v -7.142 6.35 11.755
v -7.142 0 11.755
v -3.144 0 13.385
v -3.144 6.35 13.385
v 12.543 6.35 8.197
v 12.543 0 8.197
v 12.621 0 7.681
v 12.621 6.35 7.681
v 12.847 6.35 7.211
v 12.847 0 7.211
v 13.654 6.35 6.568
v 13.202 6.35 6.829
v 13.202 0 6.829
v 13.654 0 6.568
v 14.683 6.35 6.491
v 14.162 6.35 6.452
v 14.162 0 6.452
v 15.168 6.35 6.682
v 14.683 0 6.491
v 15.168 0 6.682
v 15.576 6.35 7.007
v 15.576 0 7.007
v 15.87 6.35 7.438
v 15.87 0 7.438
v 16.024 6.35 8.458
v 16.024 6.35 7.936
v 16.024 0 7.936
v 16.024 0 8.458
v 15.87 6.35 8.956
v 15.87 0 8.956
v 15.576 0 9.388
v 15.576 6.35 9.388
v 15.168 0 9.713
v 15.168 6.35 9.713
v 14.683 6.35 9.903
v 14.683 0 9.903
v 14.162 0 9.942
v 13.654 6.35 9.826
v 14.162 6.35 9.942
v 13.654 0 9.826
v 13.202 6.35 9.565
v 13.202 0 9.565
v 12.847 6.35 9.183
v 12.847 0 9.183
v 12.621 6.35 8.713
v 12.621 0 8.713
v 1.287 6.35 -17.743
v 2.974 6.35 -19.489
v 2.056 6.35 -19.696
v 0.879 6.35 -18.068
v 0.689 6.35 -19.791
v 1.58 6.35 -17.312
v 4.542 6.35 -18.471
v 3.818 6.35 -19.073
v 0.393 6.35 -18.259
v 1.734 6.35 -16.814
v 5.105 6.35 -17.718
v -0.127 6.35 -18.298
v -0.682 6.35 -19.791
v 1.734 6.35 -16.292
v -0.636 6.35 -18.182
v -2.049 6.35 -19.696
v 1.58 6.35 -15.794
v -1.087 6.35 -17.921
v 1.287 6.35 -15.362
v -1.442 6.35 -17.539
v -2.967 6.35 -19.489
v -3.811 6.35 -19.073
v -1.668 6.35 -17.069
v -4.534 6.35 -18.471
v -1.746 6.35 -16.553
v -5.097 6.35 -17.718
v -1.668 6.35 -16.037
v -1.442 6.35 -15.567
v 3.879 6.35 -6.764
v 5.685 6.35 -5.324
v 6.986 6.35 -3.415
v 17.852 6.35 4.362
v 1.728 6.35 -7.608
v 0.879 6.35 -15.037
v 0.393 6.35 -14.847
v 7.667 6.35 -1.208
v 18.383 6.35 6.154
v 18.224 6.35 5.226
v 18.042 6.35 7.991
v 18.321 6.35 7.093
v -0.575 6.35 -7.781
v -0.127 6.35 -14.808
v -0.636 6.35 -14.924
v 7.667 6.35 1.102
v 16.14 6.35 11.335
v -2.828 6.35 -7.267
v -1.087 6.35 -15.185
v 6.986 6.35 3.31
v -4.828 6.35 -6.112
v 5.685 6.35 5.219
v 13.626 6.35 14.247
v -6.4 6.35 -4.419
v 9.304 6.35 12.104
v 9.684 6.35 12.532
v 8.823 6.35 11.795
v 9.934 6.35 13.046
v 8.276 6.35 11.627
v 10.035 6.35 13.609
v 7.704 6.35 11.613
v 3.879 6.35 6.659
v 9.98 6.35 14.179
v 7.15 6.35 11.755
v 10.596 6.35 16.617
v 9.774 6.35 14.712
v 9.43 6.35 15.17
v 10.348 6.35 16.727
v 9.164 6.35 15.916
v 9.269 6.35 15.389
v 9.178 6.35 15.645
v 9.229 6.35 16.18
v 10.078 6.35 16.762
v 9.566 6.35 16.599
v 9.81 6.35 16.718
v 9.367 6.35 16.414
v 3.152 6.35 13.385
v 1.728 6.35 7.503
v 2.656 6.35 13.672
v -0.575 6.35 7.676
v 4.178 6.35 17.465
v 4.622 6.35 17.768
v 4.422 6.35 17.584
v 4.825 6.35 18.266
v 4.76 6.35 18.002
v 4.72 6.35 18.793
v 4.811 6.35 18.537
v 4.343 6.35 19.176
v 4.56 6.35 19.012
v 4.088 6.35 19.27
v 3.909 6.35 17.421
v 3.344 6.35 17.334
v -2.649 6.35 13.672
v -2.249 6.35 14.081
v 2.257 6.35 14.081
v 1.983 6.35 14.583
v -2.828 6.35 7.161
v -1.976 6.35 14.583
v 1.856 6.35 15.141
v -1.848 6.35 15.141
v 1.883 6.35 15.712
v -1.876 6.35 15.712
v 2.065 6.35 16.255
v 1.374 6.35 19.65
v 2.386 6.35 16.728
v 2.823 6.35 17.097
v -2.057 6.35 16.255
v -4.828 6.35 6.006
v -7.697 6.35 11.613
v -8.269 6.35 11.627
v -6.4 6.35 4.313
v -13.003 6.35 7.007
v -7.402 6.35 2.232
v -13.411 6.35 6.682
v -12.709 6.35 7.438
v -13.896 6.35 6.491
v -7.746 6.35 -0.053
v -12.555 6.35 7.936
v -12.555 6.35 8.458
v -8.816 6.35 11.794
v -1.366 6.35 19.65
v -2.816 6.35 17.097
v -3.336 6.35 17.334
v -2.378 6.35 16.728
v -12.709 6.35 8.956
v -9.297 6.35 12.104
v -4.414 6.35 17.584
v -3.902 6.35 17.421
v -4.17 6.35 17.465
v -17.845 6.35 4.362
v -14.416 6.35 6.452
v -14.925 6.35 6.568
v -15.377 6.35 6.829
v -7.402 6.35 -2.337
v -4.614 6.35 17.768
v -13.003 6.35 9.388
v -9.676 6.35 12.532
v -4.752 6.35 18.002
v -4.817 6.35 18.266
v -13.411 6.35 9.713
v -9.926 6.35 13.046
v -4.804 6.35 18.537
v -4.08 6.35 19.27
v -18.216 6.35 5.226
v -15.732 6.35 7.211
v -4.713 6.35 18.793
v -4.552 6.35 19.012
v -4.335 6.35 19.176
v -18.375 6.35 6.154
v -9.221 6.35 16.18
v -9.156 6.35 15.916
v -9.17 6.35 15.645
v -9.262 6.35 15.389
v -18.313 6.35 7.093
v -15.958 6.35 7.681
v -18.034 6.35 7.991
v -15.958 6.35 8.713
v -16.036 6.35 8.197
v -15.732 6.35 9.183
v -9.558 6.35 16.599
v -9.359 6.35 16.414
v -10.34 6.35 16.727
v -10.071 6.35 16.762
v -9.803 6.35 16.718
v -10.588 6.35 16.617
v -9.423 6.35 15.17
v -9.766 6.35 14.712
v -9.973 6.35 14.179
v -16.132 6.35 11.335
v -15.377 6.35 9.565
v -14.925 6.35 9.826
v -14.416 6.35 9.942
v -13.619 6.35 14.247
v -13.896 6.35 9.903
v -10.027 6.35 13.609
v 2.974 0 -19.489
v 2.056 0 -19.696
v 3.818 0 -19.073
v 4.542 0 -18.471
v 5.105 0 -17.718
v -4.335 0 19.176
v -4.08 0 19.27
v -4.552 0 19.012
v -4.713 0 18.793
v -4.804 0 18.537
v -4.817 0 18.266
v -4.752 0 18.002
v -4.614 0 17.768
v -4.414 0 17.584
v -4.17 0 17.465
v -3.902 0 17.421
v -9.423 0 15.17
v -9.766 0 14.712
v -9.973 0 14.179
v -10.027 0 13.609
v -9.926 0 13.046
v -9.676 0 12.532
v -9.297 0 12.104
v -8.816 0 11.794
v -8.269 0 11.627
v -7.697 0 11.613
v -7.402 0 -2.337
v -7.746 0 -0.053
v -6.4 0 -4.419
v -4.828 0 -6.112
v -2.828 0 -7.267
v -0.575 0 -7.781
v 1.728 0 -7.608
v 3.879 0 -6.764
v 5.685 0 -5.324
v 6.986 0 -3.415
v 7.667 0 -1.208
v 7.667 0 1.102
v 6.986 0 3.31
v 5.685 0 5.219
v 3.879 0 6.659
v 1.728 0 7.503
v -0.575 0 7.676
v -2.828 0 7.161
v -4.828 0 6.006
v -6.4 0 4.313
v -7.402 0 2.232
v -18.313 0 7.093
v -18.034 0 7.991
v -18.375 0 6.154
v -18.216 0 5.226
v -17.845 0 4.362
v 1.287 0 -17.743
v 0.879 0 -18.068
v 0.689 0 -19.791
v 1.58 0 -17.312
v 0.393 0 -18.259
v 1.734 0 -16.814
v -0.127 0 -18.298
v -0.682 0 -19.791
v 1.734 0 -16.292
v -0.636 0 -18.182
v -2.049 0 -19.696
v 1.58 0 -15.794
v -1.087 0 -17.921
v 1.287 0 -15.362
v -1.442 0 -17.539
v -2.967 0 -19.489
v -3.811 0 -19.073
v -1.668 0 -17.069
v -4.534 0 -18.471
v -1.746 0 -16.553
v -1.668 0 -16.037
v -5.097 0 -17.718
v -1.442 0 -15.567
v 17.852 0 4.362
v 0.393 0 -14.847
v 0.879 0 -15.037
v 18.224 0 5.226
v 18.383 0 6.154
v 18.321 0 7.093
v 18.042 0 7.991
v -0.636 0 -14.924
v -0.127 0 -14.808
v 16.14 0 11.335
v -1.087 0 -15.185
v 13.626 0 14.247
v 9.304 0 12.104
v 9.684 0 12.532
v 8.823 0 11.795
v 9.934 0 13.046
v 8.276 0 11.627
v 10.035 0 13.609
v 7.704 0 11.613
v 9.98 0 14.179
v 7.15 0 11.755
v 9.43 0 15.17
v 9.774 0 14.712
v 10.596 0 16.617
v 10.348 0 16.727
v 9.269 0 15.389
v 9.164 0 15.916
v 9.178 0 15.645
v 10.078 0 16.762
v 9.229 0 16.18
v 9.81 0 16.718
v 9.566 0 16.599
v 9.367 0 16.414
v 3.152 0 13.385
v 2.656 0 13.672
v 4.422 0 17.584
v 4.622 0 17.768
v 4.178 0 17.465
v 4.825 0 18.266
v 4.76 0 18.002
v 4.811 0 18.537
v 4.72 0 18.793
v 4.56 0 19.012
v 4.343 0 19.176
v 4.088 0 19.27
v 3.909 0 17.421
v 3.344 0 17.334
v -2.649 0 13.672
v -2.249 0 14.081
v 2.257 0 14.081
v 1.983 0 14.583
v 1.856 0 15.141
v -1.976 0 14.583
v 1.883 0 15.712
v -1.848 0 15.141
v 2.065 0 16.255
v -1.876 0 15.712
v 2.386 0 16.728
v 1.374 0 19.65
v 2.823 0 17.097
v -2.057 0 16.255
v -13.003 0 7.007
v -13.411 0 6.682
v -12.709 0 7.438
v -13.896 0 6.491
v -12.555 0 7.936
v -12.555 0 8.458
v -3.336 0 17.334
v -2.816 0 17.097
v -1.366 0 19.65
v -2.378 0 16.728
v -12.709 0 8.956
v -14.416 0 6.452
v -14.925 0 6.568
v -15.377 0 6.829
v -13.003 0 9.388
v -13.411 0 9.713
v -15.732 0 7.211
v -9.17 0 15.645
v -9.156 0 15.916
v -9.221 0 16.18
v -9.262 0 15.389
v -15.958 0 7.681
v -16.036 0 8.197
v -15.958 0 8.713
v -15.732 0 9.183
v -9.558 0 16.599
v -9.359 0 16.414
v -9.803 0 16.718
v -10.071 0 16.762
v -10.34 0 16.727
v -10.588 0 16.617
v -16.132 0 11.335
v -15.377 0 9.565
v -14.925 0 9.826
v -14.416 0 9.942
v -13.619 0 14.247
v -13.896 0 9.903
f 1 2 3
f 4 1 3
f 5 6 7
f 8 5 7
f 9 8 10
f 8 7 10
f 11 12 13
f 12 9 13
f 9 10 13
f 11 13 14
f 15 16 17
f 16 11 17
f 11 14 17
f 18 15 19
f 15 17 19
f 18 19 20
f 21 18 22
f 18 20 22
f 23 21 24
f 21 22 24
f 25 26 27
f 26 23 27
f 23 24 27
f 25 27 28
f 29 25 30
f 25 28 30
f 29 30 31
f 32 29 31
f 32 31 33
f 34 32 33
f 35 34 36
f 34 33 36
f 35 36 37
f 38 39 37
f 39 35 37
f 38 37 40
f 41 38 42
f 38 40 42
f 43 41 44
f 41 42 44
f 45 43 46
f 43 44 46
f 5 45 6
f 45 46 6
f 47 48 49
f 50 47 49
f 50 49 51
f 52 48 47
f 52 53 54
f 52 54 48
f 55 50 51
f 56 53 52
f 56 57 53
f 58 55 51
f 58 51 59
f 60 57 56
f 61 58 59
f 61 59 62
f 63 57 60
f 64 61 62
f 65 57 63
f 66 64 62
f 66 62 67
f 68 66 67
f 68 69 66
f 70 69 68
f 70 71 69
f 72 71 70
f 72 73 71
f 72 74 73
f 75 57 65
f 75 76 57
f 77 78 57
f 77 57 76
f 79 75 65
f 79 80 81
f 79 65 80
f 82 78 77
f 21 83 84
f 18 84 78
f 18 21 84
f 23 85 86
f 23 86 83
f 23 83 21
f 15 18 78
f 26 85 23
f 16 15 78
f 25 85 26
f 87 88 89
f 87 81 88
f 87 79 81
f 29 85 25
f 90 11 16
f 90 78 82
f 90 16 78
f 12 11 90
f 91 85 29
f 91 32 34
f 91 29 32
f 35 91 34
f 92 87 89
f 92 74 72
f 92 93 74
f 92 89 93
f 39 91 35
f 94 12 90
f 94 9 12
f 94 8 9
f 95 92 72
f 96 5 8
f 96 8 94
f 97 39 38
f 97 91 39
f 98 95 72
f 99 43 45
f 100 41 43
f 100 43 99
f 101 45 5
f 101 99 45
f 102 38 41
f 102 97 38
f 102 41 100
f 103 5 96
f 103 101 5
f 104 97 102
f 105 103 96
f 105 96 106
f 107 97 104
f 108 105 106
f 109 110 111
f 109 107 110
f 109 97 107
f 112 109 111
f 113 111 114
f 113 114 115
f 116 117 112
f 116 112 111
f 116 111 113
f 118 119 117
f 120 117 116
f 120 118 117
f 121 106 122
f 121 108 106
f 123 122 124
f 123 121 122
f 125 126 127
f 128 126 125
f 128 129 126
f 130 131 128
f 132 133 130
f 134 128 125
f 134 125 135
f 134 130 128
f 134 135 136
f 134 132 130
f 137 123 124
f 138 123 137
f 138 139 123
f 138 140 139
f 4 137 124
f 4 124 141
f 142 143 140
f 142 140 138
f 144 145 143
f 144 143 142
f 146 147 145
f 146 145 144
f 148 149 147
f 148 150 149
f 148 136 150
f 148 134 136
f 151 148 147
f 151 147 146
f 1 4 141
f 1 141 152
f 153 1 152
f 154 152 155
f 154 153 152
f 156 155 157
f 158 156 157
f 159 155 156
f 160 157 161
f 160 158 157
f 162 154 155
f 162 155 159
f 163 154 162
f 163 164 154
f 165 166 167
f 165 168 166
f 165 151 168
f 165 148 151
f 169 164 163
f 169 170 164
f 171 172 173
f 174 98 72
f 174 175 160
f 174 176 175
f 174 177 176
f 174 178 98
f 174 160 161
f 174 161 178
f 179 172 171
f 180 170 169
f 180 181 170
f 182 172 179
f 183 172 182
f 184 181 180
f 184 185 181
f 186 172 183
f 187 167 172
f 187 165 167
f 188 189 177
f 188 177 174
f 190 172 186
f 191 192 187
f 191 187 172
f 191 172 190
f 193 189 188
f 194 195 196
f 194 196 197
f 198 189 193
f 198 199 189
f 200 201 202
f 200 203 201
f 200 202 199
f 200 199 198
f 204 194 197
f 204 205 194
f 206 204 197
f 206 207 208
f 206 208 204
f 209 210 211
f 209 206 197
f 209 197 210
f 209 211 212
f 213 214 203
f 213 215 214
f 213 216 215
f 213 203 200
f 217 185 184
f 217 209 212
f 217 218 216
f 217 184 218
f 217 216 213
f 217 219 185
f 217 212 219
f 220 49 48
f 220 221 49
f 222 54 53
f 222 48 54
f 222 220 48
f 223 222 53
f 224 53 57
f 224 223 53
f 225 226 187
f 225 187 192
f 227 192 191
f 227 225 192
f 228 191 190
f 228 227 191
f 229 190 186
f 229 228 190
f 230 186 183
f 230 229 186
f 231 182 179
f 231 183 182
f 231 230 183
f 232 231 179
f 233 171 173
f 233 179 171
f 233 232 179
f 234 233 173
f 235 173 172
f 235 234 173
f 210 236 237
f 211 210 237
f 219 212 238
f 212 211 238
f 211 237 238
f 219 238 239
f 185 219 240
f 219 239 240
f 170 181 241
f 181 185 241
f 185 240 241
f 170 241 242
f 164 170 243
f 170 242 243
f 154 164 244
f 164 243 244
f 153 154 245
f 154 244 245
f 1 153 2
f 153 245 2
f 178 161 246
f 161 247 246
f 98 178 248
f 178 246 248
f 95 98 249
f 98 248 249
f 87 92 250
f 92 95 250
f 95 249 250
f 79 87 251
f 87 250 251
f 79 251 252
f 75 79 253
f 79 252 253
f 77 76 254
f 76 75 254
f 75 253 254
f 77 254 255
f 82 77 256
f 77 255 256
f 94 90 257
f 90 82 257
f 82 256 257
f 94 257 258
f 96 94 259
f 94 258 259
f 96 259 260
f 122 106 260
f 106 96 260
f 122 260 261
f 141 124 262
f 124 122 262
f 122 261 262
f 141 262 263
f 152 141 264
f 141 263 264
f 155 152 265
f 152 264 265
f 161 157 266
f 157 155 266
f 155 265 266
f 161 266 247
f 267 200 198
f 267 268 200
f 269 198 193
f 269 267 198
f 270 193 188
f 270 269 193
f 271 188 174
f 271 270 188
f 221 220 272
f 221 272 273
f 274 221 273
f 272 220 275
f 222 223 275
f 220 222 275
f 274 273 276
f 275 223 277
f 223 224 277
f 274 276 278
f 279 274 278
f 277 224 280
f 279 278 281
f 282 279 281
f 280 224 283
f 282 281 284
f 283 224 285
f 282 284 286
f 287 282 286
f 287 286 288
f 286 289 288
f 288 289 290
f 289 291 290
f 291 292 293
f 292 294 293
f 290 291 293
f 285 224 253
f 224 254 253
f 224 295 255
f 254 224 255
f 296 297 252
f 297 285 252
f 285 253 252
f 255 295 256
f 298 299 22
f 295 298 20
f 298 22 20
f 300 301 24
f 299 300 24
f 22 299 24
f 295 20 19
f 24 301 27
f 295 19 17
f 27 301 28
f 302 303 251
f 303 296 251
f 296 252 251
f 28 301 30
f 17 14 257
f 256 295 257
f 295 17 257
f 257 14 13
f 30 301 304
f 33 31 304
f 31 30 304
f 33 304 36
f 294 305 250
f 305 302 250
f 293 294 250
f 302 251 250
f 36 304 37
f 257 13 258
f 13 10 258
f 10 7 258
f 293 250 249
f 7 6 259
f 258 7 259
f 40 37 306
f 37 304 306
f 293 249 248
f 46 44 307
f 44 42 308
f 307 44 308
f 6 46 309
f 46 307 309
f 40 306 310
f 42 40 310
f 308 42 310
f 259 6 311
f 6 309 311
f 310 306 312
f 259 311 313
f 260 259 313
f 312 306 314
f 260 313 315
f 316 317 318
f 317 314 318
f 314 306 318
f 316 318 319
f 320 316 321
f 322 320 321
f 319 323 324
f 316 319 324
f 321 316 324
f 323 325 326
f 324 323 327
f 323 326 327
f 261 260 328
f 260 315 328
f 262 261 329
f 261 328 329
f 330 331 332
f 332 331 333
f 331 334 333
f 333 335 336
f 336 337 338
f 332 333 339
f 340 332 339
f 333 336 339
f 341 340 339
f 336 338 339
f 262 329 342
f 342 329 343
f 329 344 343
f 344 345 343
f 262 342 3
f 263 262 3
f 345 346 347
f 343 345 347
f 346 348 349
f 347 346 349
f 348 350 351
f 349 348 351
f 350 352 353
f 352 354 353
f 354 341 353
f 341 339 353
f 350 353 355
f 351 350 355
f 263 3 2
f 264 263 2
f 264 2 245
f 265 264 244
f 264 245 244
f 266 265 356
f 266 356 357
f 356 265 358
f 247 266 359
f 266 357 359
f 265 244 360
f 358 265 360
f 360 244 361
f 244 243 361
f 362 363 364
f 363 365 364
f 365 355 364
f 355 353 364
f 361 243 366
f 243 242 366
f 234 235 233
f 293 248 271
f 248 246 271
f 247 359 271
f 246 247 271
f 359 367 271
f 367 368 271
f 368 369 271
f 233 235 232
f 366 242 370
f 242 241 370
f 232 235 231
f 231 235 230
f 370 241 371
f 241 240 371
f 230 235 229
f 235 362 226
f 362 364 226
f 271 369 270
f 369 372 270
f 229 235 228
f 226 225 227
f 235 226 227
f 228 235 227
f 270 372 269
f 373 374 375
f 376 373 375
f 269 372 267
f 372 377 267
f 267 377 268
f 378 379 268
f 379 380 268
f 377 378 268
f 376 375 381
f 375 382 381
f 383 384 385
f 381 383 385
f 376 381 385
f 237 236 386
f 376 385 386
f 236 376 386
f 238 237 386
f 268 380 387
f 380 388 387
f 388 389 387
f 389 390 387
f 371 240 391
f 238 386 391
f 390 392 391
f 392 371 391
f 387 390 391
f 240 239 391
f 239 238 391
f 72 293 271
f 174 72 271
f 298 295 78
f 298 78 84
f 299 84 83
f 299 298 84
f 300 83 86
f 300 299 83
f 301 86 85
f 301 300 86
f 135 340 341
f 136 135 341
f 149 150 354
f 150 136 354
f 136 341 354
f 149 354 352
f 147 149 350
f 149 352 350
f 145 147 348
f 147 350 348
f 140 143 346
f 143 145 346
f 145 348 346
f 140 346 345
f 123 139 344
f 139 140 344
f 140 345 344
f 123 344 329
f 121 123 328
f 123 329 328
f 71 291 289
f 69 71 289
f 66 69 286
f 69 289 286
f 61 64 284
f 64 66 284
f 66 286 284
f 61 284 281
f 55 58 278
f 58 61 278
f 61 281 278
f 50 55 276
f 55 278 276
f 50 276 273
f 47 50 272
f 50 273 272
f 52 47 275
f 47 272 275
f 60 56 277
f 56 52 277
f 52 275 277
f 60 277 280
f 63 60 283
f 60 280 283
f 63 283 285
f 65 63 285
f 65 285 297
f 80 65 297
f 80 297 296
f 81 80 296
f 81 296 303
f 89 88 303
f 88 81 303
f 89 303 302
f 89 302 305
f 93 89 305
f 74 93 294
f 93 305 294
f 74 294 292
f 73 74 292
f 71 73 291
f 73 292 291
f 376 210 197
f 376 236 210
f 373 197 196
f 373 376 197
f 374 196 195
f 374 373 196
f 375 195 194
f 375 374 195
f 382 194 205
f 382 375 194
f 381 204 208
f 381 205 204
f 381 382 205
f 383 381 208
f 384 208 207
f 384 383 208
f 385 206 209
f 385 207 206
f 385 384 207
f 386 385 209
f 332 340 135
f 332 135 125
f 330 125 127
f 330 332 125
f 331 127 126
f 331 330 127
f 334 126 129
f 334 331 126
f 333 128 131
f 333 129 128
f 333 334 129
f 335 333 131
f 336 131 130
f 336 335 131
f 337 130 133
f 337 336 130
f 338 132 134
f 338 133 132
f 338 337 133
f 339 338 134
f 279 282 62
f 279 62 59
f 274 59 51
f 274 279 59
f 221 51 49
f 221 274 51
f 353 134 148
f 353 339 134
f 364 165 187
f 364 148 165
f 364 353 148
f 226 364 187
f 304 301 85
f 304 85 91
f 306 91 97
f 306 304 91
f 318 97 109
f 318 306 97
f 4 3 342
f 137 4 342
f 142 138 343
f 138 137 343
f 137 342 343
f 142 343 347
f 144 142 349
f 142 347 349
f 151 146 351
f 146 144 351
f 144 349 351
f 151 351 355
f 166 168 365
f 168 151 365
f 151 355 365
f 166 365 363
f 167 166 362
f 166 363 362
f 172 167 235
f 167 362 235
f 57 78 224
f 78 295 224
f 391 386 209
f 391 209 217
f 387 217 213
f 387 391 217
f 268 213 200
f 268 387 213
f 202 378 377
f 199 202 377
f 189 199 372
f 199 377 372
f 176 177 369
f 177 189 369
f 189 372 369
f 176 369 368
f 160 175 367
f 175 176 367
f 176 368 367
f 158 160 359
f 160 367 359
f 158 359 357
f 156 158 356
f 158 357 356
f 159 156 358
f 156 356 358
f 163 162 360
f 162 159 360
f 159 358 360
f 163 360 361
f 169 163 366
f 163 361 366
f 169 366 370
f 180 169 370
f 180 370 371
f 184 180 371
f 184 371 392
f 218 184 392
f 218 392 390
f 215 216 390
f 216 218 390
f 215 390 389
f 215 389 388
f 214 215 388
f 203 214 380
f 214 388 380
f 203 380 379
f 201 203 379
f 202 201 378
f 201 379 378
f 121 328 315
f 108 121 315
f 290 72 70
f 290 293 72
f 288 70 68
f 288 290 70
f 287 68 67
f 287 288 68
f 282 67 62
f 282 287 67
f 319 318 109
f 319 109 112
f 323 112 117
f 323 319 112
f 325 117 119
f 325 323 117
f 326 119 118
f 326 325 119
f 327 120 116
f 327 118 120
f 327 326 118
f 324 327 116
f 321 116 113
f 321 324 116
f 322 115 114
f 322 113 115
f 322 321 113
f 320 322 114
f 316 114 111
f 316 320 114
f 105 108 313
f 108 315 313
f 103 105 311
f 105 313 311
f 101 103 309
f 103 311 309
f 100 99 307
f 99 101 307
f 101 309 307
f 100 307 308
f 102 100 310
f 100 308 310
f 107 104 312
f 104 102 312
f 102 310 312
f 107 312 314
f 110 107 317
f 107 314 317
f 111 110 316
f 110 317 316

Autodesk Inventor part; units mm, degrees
ref_plane "YZ Plane" through (0, 0, 0) normal (1, 0, 0) x (0, 1, 0)
ref_plane "XZ Plane" through (0, 0, 0) normal (0, 1, 0) x (-1, 0, 0)
ref_plane "XY Plane" through (0, 0, 0) normal (0, 0, 1) x (1, 0, 0)
sketch "Sketch1" plane through (0, 0, 0) normal (0, 1, 0) x (-1, 0, 0)
  circle A0 centre (-0.0038, -16.5528) radius 1.75
  circle A1 centre (-0.0038, -0.0528) radius 7.75
  circle A2 centre (-14.2932, 8.1972) radius 1.75
  circle A3 centre (14.2856, 8.1972) radius 1.75
  arc A4 (3.9019, 17.421) -> (3.1441, 13.3853) centre (3.9353, 15.3257) ccw
  arc A5 (3.9019, 17.421) -> (4.0803, 19.2703) centre (3.8869, 18.3557) ccw
  arc A6 (4.0803, 19.2703) -> (-4.0878, 19.2703) centre (-0.0038, -0.0528) ccw
  arc A7 (-4.0878, 19.2703) -> (-3.9094, 17.421) centre (-3.8945, 18.3557) ccw
  arc A8 (-3.1517, 13.3853) -> (-3.9094, 17.421) centre (-3.9429, 15.3257) ccw
  line L0 (-3.1517, 13.3853) -> (-7.1501, 11.755)
  arc A9 (-9.4303, 15.1698) -> (-7.1501, 11.755) centre (-7.9413, 13.6954) ccw
  arc A10 (-9.4303, 15.1698) -> (-10.596, 16.6166) centre (-10.0946, 15.8276) ccw
  arc A11 (-10.596, 16.6166) -> (-18.0415, 7.991) centre (-0.0038, -0.0528) ccw
  arc A12 (-18.0415, 7.991) -> (-17.8524, 4.3619) centre (-14.3883, 6.3619) ccw
  line L1 (-17.8524, 4.3619) -> (-5.1048, -17.7175)
  arc A13 (-5.1048, -17.7175) -> (-2.0565, -19.6958) centre (-1.6407, -15.7175) ccw
  arc A14 (-2.0565, -19.6958) -> (2.0489, -19.6958) centre (-0.0038, -0.0528) ccw
  arc A15 (2.0489, -19.6958) -> (5.0973, -17.7175) centre (1.6332, -15.7175) ccw
  line L2 (5.0973, -17.7175) -> (17.8448, 4.3619)
  arc A16 (17.8448, 4.3619) -> (18.0339, 7.991) centre (14.3807, 6.3619) ccw
  arc A17 (18.0339, 7.991) -> (10.5884, 16.6166) centre (-0.0038, -0.0528) ccw
  arc A18 (10.5884, 16.6166) -> (9.4227, 15.1698) centre (10.087, 15.8276) ccw
  arc A19 (7.1425, 11.755) -> (9.4227, 15.1698) centre (7.9337, 13.6954) ccw
  line L3 (7.1425, 11.755) -> (3.1441, 13.3853)
extrude "Extrusion1" add sketch "Sketch1" along normal blind 6.35
properties part number "LowerPlate"
